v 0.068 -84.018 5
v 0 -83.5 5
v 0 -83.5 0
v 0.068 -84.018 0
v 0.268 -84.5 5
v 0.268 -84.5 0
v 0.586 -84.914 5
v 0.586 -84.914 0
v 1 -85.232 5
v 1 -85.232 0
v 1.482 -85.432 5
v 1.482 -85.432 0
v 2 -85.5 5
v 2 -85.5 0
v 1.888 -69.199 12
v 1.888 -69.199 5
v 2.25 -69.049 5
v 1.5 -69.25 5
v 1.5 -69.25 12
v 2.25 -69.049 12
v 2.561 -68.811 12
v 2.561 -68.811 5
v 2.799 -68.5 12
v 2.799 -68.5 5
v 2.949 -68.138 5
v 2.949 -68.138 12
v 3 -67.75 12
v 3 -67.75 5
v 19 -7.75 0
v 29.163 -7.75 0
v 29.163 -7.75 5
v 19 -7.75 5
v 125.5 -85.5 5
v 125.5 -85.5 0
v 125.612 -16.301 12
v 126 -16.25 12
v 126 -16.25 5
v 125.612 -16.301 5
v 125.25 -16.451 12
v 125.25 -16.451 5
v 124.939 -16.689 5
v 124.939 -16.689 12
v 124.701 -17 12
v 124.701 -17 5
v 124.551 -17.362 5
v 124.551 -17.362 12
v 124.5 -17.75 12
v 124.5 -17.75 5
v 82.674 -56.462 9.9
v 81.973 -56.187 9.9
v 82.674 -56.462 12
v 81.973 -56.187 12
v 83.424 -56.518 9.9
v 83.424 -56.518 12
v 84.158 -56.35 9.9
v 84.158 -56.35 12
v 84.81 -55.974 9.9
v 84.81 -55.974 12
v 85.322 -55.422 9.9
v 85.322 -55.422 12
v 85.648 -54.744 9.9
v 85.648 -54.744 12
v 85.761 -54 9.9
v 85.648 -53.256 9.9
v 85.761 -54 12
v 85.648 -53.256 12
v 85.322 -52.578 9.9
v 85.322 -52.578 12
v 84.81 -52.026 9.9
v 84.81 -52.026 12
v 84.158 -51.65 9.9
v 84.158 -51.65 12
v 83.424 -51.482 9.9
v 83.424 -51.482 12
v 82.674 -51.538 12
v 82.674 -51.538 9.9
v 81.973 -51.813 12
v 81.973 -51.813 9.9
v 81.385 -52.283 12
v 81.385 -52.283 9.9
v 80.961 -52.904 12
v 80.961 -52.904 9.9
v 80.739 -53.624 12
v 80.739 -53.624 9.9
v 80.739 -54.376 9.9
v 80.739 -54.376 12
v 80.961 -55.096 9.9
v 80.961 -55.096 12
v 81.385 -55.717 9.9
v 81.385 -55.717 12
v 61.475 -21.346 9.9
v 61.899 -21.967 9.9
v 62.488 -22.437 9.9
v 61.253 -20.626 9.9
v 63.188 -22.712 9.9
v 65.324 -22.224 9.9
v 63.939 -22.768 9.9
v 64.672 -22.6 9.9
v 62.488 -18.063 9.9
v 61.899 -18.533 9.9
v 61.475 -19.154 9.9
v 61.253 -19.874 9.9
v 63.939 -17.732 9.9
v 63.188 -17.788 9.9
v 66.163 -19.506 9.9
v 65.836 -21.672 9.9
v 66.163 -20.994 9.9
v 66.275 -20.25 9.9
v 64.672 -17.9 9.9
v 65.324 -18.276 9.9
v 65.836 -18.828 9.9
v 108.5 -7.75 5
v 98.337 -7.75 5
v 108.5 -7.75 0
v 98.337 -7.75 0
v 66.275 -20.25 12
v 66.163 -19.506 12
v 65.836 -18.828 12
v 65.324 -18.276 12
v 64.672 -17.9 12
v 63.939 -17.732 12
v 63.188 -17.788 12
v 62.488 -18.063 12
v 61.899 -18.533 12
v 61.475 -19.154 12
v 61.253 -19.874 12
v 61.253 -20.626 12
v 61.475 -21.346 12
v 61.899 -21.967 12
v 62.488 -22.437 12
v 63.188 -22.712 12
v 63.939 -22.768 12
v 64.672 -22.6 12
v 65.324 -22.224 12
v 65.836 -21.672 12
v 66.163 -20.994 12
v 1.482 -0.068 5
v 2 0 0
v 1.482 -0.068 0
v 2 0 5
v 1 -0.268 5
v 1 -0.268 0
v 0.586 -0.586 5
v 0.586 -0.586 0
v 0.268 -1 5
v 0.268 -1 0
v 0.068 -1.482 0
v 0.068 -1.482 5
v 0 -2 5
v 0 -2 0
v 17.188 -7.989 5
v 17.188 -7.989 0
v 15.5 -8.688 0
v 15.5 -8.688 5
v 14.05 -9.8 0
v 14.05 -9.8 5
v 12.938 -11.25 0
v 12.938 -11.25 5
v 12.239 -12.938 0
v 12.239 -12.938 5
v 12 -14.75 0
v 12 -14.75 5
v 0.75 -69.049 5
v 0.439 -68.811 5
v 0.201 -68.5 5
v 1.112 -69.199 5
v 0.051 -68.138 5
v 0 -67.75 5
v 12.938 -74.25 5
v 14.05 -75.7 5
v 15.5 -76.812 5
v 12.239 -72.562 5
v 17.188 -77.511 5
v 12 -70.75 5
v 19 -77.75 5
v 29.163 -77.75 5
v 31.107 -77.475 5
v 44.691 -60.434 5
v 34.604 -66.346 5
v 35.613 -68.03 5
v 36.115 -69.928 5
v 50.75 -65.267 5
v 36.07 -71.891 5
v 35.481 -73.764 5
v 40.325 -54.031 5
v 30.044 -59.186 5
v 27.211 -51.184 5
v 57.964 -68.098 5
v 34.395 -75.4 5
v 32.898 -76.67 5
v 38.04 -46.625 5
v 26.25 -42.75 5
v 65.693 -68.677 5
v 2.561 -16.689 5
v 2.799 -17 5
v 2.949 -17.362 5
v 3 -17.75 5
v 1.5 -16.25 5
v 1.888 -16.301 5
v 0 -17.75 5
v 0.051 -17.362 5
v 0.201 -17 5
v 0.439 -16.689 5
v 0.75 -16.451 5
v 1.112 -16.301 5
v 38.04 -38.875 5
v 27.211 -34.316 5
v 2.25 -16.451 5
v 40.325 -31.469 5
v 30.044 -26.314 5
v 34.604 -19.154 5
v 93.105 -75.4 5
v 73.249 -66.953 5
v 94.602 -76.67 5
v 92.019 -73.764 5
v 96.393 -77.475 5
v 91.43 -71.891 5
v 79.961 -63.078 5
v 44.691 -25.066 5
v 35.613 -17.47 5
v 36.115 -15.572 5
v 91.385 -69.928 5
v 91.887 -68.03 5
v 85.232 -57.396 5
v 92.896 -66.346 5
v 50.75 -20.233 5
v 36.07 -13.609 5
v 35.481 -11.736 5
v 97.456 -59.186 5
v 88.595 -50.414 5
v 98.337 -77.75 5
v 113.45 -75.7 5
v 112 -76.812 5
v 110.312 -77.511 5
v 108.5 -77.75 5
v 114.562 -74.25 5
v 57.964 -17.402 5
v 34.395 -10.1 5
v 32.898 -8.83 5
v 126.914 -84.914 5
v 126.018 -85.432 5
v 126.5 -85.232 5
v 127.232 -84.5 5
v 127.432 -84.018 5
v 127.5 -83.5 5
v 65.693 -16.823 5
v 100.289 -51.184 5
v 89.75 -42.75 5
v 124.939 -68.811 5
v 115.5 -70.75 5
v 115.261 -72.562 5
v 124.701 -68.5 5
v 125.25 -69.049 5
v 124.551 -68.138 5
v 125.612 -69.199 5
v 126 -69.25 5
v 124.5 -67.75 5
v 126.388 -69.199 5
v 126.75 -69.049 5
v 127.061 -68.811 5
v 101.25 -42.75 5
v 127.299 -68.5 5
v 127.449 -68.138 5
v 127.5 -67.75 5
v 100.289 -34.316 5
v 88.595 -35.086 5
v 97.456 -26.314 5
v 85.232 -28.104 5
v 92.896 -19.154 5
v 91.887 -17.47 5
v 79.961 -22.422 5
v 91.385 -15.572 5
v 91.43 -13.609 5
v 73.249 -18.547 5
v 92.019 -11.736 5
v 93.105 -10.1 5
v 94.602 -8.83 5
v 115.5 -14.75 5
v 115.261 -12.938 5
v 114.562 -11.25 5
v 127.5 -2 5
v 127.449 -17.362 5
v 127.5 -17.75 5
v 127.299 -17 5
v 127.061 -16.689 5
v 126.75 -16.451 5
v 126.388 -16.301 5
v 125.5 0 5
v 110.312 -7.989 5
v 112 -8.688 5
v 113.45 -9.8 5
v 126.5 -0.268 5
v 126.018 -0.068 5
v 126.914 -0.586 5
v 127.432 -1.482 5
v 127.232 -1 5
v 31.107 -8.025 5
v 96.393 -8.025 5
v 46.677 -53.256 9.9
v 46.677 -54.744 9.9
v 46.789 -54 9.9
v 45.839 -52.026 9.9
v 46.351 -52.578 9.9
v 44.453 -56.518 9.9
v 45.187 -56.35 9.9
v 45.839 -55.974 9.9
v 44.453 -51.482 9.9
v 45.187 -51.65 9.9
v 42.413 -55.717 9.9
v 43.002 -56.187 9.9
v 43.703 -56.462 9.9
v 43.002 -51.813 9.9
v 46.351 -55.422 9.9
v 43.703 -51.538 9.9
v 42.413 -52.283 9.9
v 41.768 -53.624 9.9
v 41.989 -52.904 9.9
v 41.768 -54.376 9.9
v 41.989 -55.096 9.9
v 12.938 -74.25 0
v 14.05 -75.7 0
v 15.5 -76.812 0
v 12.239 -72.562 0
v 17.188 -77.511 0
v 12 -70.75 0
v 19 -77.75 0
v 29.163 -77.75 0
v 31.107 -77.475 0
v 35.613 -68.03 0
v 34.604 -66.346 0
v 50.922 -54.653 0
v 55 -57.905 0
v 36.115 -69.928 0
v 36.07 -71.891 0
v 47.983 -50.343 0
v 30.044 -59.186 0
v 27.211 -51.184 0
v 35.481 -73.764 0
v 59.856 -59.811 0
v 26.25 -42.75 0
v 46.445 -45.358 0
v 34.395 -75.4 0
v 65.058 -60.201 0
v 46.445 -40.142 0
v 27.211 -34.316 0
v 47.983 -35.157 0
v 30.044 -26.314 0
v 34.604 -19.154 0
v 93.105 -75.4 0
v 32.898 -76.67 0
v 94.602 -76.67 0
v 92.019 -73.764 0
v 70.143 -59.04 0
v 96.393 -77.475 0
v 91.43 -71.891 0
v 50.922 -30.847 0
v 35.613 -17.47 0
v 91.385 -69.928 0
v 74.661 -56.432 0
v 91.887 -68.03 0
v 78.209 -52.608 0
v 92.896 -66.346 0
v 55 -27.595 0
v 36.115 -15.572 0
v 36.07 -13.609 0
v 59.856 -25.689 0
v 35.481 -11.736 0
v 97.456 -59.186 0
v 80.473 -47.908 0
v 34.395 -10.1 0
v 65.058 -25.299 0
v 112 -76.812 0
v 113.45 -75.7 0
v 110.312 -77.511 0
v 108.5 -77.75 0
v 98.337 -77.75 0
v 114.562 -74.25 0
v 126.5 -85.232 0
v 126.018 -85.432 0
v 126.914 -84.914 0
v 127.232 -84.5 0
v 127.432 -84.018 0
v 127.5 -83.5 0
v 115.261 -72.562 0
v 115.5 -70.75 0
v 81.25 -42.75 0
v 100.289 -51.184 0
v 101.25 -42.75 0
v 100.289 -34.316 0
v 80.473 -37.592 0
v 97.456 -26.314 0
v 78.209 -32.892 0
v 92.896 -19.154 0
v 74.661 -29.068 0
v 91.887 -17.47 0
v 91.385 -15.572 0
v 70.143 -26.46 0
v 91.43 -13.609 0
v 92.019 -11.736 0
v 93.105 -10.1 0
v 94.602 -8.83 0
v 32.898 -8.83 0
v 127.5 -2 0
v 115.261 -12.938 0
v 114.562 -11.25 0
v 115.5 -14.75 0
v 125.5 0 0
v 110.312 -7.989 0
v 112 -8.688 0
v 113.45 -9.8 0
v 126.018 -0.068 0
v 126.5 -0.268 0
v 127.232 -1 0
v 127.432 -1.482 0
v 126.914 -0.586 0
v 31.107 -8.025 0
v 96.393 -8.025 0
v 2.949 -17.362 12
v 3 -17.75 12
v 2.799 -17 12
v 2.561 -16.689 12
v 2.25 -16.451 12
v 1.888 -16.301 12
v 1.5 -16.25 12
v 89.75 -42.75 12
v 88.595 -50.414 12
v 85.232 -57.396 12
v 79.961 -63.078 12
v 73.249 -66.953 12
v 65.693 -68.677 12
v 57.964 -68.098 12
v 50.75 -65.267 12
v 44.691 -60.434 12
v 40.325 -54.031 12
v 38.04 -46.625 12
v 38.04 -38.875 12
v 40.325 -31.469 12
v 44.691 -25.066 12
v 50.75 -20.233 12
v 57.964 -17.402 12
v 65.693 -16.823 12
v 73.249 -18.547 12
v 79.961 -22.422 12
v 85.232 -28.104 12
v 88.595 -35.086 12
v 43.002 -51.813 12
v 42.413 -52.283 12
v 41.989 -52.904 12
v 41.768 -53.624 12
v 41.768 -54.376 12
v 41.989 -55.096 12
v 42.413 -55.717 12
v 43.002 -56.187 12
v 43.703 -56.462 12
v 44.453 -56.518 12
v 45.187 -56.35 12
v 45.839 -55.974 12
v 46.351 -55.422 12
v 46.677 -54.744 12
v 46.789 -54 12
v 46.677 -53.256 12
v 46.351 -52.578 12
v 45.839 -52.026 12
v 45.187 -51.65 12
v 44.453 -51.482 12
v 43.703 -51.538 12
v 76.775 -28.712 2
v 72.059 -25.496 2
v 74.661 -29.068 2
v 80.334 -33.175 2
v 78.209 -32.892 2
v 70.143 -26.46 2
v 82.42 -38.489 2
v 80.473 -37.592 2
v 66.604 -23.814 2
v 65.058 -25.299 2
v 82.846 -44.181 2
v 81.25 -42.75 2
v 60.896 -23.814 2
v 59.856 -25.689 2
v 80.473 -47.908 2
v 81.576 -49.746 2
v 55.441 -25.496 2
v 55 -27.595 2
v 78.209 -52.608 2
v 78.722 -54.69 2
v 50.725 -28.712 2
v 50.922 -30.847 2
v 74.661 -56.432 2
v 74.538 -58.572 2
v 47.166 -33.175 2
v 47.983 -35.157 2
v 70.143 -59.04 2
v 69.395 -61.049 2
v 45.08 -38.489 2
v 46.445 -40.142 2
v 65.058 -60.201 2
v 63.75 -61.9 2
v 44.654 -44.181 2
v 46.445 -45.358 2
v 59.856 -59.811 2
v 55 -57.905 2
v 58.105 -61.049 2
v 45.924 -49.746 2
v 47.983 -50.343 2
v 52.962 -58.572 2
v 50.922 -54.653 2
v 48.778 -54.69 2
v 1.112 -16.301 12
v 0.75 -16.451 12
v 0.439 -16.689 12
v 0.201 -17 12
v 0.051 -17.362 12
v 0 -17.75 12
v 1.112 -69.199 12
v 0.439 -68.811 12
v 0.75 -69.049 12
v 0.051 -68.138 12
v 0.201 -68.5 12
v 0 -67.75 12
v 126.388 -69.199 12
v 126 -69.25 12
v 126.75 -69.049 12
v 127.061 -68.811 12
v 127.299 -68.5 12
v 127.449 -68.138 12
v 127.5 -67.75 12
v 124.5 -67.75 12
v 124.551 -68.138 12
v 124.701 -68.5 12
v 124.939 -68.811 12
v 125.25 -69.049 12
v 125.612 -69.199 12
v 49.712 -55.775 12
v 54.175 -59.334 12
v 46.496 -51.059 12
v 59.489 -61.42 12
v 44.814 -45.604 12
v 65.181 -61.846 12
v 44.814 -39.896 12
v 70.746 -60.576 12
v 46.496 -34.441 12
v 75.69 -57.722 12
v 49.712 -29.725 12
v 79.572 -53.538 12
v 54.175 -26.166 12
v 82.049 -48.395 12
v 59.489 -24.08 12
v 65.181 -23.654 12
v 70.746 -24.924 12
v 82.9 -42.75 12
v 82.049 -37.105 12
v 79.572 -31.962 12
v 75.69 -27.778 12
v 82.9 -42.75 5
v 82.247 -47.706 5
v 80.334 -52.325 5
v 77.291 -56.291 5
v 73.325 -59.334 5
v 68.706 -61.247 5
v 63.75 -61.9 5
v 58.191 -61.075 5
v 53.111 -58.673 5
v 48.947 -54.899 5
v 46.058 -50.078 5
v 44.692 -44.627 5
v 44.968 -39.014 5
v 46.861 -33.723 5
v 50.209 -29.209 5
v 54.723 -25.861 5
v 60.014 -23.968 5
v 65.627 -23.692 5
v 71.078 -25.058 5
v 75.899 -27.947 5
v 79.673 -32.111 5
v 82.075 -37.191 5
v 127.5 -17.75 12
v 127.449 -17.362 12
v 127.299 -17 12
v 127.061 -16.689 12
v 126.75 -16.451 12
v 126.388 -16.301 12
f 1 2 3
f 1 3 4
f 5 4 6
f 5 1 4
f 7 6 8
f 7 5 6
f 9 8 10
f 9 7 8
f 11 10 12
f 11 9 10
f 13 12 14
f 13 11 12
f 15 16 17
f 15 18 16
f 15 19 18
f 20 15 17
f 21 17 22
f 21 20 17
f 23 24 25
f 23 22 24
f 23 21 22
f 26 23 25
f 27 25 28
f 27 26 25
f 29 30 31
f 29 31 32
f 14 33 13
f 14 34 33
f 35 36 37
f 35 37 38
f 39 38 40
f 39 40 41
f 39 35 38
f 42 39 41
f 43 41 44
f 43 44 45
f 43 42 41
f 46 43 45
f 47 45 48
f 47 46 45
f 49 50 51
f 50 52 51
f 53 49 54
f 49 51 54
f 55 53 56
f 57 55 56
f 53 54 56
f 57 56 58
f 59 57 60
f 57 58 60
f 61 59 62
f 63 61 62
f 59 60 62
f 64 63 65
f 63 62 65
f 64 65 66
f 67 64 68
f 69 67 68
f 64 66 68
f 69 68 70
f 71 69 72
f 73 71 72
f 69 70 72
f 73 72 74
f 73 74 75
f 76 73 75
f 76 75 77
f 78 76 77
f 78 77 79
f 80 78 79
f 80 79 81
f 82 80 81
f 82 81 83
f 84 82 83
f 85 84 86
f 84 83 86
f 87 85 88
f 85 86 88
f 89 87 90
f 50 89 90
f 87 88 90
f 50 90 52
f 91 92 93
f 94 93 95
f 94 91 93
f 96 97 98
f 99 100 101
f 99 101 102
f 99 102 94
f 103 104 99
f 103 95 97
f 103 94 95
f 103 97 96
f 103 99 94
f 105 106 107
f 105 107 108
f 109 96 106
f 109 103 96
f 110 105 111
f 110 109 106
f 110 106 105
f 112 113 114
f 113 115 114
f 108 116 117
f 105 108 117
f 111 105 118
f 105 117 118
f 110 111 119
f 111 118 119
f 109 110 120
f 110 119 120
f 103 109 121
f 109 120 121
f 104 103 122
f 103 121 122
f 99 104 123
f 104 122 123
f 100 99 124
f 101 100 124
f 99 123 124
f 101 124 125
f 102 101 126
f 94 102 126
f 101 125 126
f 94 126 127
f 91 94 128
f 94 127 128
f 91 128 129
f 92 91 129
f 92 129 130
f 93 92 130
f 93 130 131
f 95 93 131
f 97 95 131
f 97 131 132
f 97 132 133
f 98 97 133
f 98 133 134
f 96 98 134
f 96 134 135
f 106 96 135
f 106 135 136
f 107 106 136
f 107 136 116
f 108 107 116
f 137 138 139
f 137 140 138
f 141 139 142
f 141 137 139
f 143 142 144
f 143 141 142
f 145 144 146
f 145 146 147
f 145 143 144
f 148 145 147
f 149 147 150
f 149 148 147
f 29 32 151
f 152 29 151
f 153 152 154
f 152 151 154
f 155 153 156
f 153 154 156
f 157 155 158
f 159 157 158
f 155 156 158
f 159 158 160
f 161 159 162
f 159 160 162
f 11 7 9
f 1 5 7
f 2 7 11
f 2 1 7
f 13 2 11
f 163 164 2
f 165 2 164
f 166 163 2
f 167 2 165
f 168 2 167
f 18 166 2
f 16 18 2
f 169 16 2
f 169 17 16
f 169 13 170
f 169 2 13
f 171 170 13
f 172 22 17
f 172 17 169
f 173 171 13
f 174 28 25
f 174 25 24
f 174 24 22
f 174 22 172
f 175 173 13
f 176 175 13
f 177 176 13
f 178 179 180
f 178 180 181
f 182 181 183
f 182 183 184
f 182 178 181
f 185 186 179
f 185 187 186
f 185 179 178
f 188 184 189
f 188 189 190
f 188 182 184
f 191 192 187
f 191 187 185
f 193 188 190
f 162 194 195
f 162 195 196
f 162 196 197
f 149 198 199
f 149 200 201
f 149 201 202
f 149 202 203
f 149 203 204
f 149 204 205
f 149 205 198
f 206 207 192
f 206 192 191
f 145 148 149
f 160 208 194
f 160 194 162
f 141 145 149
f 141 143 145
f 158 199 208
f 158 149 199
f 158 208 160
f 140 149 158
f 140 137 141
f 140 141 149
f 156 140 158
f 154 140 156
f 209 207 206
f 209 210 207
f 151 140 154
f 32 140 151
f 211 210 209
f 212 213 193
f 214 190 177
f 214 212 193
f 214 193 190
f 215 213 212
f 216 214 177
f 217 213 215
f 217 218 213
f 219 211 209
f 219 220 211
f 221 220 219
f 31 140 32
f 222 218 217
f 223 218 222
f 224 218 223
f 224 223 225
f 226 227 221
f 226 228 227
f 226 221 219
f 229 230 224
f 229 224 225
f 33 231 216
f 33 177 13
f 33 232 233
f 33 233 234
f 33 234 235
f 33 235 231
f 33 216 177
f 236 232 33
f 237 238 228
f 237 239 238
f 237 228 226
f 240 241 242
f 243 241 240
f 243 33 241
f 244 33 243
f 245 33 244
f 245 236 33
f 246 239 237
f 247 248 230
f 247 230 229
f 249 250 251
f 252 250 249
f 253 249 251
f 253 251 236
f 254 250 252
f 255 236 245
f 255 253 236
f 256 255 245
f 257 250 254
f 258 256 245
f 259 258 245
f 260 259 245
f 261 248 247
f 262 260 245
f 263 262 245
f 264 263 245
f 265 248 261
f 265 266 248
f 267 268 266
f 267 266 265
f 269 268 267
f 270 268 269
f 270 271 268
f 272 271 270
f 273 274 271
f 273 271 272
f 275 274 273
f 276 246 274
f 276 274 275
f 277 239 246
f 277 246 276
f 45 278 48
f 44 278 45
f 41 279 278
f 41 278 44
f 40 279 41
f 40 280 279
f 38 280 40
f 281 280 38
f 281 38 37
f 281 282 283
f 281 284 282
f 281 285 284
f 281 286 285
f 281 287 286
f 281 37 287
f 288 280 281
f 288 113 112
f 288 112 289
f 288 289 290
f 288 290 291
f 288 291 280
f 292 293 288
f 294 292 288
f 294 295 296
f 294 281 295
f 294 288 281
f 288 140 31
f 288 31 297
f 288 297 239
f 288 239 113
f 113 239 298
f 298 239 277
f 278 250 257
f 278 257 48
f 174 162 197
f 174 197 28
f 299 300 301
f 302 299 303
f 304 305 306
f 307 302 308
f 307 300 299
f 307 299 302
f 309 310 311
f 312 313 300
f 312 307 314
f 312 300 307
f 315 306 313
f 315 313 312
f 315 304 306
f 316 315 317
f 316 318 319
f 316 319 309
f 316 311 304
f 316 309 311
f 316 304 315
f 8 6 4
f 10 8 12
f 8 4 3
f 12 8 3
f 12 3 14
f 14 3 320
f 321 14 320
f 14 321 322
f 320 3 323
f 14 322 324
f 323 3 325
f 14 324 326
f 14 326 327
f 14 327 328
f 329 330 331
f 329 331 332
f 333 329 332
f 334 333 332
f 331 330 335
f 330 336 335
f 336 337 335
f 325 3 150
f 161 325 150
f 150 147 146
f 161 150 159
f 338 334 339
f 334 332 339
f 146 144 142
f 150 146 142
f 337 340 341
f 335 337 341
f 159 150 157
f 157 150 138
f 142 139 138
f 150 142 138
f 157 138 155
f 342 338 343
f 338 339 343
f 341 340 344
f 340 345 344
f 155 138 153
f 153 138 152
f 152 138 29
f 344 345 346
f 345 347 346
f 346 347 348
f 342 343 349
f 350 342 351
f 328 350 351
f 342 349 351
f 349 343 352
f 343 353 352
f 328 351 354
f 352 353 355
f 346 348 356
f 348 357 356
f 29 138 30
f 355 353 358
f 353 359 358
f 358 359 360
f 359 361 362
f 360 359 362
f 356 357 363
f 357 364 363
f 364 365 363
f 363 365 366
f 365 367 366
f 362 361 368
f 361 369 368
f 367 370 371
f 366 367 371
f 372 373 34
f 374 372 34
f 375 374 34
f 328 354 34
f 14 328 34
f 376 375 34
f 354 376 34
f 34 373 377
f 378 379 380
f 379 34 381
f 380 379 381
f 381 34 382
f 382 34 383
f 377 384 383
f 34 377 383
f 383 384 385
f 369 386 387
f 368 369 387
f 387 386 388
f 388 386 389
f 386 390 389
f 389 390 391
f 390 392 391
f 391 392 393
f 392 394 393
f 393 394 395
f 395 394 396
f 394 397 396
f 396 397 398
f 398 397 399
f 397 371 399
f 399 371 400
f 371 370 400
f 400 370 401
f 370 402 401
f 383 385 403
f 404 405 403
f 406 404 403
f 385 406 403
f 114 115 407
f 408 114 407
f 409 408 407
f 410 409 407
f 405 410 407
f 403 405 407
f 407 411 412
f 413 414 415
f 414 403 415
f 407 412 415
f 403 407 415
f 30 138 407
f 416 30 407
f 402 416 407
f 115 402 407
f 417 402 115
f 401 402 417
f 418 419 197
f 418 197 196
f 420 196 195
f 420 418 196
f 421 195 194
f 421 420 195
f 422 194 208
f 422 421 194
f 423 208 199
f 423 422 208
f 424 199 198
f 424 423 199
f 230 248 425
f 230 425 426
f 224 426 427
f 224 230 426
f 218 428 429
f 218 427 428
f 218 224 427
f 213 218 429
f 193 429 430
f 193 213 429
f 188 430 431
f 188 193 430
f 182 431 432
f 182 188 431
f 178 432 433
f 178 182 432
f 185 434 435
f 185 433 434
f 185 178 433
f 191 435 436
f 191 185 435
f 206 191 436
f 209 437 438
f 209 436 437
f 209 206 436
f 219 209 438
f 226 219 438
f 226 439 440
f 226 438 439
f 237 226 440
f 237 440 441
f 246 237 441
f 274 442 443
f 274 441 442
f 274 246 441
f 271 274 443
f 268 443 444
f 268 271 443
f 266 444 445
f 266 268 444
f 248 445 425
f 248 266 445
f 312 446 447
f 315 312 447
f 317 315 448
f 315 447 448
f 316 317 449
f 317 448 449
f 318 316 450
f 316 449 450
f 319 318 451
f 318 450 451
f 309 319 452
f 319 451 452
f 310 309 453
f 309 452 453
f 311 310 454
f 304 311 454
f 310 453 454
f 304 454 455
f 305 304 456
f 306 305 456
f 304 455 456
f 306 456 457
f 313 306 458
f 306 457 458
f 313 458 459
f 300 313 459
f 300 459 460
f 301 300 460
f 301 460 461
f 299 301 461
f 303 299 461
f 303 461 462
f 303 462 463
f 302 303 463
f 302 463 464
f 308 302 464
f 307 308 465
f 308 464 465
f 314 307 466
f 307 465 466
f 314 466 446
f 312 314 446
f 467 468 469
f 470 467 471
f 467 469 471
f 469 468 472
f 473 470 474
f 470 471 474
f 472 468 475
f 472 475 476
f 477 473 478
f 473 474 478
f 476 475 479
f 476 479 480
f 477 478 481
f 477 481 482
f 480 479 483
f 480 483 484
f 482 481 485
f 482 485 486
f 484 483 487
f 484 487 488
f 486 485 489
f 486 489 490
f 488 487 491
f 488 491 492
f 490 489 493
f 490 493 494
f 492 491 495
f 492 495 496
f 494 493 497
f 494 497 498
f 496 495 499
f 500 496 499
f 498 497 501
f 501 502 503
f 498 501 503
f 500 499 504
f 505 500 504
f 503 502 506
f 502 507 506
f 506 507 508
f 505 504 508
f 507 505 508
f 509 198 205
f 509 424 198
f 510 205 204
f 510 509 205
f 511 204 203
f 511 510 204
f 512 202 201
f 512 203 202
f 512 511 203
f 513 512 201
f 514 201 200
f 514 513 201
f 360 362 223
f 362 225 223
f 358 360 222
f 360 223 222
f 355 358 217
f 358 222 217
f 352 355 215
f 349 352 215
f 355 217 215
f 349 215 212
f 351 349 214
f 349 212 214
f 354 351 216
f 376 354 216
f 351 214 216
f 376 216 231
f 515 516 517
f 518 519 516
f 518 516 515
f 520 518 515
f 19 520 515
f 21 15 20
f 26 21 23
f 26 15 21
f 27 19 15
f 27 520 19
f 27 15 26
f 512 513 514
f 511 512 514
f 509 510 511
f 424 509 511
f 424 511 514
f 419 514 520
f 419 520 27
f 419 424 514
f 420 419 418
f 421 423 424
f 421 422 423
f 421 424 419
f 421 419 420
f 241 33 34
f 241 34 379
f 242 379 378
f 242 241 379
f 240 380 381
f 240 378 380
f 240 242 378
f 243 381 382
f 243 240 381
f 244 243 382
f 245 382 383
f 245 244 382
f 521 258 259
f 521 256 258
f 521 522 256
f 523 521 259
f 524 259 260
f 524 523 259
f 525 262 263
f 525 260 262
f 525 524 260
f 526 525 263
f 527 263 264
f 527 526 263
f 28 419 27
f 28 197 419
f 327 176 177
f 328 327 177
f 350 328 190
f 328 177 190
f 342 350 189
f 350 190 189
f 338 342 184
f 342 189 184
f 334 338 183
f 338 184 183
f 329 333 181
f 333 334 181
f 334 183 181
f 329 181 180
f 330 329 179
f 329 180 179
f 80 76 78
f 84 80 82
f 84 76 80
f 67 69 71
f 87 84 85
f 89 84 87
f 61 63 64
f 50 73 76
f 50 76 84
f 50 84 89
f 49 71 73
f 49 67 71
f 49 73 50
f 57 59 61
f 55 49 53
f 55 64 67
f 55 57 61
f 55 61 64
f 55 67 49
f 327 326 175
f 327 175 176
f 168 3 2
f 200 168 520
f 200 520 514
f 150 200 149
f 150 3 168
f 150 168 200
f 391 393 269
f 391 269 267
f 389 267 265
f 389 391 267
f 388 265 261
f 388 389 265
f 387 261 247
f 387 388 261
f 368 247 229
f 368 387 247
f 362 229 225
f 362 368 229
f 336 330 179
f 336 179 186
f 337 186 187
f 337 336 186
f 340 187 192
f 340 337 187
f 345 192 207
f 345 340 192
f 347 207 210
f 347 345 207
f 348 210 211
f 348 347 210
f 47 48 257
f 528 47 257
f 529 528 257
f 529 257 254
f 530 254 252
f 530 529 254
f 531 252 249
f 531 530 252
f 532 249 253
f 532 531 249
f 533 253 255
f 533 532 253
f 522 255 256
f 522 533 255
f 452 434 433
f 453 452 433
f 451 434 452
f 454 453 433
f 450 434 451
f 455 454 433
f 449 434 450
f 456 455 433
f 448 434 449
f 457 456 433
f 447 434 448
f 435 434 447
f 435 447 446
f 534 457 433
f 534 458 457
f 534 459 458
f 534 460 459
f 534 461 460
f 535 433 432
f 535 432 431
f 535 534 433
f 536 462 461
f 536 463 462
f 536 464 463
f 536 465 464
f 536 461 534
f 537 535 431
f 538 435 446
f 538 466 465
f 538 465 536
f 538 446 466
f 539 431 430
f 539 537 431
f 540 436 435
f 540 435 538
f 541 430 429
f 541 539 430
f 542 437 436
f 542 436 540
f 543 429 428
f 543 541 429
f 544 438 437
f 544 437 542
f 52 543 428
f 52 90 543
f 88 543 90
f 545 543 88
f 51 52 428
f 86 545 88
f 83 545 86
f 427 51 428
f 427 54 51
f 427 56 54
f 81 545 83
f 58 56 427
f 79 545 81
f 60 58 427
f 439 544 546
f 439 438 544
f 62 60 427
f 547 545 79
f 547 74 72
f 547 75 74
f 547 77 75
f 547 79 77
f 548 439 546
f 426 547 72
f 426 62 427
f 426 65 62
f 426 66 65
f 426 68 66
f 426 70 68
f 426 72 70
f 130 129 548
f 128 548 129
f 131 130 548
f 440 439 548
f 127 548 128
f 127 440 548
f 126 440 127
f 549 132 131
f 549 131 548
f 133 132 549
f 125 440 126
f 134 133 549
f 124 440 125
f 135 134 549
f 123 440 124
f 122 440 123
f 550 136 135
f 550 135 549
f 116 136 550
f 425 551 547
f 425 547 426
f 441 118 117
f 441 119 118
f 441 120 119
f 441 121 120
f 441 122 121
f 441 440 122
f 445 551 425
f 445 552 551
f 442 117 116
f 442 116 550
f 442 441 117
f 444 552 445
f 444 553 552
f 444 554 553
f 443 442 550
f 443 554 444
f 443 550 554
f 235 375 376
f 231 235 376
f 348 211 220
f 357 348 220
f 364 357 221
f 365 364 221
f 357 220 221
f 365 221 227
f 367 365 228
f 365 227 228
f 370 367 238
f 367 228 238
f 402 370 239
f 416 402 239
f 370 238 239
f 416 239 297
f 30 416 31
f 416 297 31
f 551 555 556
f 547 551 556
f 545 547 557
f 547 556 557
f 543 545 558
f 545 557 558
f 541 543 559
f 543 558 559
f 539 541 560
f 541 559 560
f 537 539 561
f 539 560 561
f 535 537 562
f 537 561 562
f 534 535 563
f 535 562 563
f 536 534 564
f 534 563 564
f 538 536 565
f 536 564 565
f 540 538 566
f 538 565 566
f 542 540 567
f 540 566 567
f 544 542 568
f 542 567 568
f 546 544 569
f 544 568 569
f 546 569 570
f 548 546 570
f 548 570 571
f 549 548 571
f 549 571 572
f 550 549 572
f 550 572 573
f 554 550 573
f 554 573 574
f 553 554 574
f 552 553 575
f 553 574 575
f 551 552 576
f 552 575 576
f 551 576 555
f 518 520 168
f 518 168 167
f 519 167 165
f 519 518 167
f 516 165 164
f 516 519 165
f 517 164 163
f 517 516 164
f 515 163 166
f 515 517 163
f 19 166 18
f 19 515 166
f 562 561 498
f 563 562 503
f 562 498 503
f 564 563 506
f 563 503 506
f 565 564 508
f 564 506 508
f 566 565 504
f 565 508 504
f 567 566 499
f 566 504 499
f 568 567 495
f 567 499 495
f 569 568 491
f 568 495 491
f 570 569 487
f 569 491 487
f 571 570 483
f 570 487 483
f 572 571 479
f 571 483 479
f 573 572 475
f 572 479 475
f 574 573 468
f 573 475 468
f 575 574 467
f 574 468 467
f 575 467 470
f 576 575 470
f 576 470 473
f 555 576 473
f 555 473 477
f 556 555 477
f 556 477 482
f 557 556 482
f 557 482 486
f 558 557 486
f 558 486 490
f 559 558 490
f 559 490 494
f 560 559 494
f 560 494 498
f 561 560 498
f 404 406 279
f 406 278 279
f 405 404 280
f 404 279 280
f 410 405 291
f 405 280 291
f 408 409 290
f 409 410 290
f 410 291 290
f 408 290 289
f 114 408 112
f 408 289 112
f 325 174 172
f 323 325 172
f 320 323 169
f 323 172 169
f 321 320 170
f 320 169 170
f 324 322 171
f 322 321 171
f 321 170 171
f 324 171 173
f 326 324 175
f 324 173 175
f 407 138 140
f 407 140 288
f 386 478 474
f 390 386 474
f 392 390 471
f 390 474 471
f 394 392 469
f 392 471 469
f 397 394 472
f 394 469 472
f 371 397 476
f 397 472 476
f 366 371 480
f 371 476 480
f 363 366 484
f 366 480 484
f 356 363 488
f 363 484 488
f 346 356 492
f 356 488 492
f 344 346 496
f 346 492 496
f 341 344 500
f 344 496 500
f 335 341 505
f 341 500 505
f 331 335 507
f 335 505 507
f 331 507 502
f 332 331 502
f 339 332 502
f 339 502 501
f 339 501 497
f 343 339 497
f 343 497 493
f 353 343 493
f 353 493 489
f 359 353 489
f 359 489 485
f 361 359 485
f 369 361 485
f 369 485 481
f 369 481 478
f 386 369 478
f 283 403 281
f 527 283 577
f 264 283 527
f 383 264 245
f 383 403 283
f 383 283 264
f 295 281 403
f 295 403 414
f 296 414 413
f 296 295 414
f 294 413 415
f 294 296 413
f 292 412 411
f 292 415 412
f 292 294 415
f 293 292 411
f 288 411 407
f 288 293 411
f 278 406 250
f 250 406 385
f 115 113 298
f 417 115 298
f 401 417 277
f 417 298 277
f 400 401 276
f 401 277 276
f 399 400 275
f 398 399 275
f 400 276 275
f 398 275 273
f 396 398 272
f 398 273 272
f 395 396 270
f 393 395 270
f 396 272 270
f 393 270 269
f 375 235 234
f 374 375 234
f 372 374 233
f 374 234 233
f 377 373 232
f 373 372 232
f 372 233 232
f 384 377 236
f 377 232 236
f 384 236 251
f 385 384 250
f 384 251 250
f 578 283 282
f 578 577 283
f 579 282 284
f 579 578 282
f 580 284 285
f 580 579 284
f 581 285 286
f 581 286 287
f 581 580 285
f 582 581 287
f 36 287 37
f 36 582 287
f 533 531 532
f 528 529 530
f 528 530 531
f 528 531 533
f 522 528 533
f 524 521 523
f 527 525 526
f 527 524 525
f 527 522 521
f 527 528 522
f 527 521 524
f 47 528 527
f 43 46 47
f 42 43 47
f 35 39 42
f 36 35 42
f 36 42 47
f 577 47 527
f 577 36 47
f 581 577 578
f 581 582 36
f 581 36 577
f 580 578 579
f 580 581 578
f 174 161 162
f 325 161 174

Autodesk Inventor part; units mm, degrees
ref_plane "YZ Plane" through (0, 0, 0) normal (1, 0, 0) x (0, 1, 0)
ref_plane "XZ Plane" through (0, 0, 0) normal (0, 1, 0) x (-1, 0, 0)
ref_plane "XY Plane" through (0, 0, 0) normal (0, 0, 1) x (1, 0, 0)
sketch "Skizze1" plane through (0, 0, 0) normal (0, 0, 1) x (1, 0, 0)
  line L0 (0, 0) -> (127.5, 0)
  line L1 (127.5, 0) -> (127.5, -85.5)
  line L2 (127.5, -85.5) -> (0, -85.5)
  line L3 (0, -85.5) -> (0, 0)
  dimension "d0" = 127.5
  dimension "d1" = 85.5
extrude "Extrusion1" add sketch "Skizze1" along normal blind 5
sketch "Skizze2" plane through (0, 0, 5) normal (0, 0, 1) x (1, 0, 0)
  line L0 (0, -16.25) -> (3, -16.25)
  line L1 (3, -16.25) -> (3, -69.25)
  line L2 (3, -69.25) -> (0, -69.25)
  line L3 (0, -69.25) -> (0, -16.25)
  line L4 (63.75, 42.9175) -> (63.75, -147.2432)
  line L5 (127.5, -85.5) -> (127.5, 0) projected
  line L6 (127.5, -16.25) -> (124.5, -16.25)
  line L7 (124.5, -16.25) -> (124.5, -69.25)
  line L8 (124.5, -69.25) -> (127.5, -69.25)
  line L9 (127.5, -69.25) -> (127.5, -16.25)
  point P0 (0, 0)
  dimension "d4" = 3
  dimension "d5" = 53
  dimension "d6" = 16.25
  dimension "d7" = 63.75
extrude "Extrusion2" add sketch "Skizze2" along normal blind 7
fillet "Rundung1" radius 2 4 edges at (0, 0, 2.5) (127.5, 0, 2.5) (127.5, -85.5, 2.5) (0, -85.5, 2.5)
fillet "Rundung2" radius 1.5 8 edges at (3, -69.25, 8.5) (0, -69.25, 8.5) (3, -16.25, 8.5) (0, -16.25, 8.5) (124.5, -16.25, 8.5) (127.5, -16.25, 8.5) (124.5, -69.25, 8.5) (127.5, -69.25, 8.5)
sketch "Skizze3" plane through (0, 0, 5) normal (0, 0, 1) x (1, 0, 0)
  circle A0 centre (63.75, -42.75) radius 17.5
  line L0 (0, -67.75) -> (0, -83.5) projected
  point P0 (0, 0)
  dimension "d12" = 35
  dimension "d13" = 63.75
  dimension "d14" = 42.75
extrude "Extrusion3" cut sketch "Skizze3" against normal blind 10
hole "Bohrung1" at (63.75, -42.75, 5) direction (0, 0, -1) diameter 38.3 depth 3
sketch "Skizze4" plane through (0, 0, 0) normal (0, 0, -1) x (-1, 0, 0)
  line L0 (-125.5, -85.5) -> (-2, -85.5) projected
  line L1 (0, -83.5) -> (0, -2) projected
  line L2 (-12, -77.75) -> (-50.2871, -77.75)
  line L3 (-50.2871, -7.75) -> (-12, -7.75)
  line L4 (-12, -7.75) -> (-12, -77.75)
  line L5 (-63.75, -42.75) -> (-63.75, -99.3052)
  line L6 (-115.5, -77.75) -> (-77.2129, -77.75)
  line L7 (-77.2129, -7.75) -> (-115.5, -7.75)
  line L8 (-115.5, -7.75) -> (-115.5, -77.75)
  arc A0 (-50.2871, -77.75) -> (-50.2871, -7.75) centre (-63.75, -42.75) ccw
  arc A1 (-77.2129, -7.75) -> (-77.2129, -77.75) centre (-63.75, -42.75) ccw
  arc A2 (-50.2871, -77.75) -> (-50.2871, -7.75) centre (-63.75, -42.75) ccw
  arc A3 (-77.2129, -7.75) -> (-77.2129, -77.75) centre (-63.75, -42.75) ccw
  point P0 (0, 0)
  dimension "d27" = 42.75
  dimension "d28" = 63.75
  dimension "d29" = 12
  dimension "d30" = 70
  dimension "d31" = 7.75
extrude "Extrusion4" cut sketch "Skizze4" against normal blind 10
fillet "Rundung3" radius 7 4 edges at (50.2871, -77.75, 2.5) (77.2129, -77.75, 2.5) (50.2871, -7.75, 2.5) (77.2129, -7.75, 2.5)
fillet "Rundung4" radius 7 4 edges at (12, -77.75, 2.5) (115.5, -77.75, 2.5) (12, -7.75, 2.5) (115.5, -7.75, 2.5)
sketch "Skizze5" plane through (0, 0, 5) normal (0, 0, 1) x (1, 0, 0)
  circle A0 centre (63.75, -42.75) radius 19.15
  circle A1 centre (63.75, -42.75) radius 26
  line L0 (125.5, 0) -> (2, 0) projected
  point P0 (0, 0)
  dimension "d36" = 38.3
  dimension "d37" = 52
  dimension "d38" = 42.75
  dimension "d39" = 63.75
extrude "Extrusion5" add sketch "Skizze5" along normal blind 7
sketch "Skizze6" plane through (63.75, -42.75, 12) normal (0, 0, 1) x (1, 0, 0)
  circle A0 centre (0, 22.5) radius 2.525
  circle A1 centre (0, 0) radius 17.5 projected
  point P0 (-63.75, 42.75)
  dimension "d44" = 5.05
  dimension "d45" = 22.5
extrude "Extrusion6" cut sketch "Skizze6" against normal blind 2.1 contours A0
pattern_circular "Runde Anordnung1" count 3 over 360 about axis through (63.75, -42.75, 5) along (0, 0, 1) of "Extrusion6"
properties part number "Sensor Halterung381"
